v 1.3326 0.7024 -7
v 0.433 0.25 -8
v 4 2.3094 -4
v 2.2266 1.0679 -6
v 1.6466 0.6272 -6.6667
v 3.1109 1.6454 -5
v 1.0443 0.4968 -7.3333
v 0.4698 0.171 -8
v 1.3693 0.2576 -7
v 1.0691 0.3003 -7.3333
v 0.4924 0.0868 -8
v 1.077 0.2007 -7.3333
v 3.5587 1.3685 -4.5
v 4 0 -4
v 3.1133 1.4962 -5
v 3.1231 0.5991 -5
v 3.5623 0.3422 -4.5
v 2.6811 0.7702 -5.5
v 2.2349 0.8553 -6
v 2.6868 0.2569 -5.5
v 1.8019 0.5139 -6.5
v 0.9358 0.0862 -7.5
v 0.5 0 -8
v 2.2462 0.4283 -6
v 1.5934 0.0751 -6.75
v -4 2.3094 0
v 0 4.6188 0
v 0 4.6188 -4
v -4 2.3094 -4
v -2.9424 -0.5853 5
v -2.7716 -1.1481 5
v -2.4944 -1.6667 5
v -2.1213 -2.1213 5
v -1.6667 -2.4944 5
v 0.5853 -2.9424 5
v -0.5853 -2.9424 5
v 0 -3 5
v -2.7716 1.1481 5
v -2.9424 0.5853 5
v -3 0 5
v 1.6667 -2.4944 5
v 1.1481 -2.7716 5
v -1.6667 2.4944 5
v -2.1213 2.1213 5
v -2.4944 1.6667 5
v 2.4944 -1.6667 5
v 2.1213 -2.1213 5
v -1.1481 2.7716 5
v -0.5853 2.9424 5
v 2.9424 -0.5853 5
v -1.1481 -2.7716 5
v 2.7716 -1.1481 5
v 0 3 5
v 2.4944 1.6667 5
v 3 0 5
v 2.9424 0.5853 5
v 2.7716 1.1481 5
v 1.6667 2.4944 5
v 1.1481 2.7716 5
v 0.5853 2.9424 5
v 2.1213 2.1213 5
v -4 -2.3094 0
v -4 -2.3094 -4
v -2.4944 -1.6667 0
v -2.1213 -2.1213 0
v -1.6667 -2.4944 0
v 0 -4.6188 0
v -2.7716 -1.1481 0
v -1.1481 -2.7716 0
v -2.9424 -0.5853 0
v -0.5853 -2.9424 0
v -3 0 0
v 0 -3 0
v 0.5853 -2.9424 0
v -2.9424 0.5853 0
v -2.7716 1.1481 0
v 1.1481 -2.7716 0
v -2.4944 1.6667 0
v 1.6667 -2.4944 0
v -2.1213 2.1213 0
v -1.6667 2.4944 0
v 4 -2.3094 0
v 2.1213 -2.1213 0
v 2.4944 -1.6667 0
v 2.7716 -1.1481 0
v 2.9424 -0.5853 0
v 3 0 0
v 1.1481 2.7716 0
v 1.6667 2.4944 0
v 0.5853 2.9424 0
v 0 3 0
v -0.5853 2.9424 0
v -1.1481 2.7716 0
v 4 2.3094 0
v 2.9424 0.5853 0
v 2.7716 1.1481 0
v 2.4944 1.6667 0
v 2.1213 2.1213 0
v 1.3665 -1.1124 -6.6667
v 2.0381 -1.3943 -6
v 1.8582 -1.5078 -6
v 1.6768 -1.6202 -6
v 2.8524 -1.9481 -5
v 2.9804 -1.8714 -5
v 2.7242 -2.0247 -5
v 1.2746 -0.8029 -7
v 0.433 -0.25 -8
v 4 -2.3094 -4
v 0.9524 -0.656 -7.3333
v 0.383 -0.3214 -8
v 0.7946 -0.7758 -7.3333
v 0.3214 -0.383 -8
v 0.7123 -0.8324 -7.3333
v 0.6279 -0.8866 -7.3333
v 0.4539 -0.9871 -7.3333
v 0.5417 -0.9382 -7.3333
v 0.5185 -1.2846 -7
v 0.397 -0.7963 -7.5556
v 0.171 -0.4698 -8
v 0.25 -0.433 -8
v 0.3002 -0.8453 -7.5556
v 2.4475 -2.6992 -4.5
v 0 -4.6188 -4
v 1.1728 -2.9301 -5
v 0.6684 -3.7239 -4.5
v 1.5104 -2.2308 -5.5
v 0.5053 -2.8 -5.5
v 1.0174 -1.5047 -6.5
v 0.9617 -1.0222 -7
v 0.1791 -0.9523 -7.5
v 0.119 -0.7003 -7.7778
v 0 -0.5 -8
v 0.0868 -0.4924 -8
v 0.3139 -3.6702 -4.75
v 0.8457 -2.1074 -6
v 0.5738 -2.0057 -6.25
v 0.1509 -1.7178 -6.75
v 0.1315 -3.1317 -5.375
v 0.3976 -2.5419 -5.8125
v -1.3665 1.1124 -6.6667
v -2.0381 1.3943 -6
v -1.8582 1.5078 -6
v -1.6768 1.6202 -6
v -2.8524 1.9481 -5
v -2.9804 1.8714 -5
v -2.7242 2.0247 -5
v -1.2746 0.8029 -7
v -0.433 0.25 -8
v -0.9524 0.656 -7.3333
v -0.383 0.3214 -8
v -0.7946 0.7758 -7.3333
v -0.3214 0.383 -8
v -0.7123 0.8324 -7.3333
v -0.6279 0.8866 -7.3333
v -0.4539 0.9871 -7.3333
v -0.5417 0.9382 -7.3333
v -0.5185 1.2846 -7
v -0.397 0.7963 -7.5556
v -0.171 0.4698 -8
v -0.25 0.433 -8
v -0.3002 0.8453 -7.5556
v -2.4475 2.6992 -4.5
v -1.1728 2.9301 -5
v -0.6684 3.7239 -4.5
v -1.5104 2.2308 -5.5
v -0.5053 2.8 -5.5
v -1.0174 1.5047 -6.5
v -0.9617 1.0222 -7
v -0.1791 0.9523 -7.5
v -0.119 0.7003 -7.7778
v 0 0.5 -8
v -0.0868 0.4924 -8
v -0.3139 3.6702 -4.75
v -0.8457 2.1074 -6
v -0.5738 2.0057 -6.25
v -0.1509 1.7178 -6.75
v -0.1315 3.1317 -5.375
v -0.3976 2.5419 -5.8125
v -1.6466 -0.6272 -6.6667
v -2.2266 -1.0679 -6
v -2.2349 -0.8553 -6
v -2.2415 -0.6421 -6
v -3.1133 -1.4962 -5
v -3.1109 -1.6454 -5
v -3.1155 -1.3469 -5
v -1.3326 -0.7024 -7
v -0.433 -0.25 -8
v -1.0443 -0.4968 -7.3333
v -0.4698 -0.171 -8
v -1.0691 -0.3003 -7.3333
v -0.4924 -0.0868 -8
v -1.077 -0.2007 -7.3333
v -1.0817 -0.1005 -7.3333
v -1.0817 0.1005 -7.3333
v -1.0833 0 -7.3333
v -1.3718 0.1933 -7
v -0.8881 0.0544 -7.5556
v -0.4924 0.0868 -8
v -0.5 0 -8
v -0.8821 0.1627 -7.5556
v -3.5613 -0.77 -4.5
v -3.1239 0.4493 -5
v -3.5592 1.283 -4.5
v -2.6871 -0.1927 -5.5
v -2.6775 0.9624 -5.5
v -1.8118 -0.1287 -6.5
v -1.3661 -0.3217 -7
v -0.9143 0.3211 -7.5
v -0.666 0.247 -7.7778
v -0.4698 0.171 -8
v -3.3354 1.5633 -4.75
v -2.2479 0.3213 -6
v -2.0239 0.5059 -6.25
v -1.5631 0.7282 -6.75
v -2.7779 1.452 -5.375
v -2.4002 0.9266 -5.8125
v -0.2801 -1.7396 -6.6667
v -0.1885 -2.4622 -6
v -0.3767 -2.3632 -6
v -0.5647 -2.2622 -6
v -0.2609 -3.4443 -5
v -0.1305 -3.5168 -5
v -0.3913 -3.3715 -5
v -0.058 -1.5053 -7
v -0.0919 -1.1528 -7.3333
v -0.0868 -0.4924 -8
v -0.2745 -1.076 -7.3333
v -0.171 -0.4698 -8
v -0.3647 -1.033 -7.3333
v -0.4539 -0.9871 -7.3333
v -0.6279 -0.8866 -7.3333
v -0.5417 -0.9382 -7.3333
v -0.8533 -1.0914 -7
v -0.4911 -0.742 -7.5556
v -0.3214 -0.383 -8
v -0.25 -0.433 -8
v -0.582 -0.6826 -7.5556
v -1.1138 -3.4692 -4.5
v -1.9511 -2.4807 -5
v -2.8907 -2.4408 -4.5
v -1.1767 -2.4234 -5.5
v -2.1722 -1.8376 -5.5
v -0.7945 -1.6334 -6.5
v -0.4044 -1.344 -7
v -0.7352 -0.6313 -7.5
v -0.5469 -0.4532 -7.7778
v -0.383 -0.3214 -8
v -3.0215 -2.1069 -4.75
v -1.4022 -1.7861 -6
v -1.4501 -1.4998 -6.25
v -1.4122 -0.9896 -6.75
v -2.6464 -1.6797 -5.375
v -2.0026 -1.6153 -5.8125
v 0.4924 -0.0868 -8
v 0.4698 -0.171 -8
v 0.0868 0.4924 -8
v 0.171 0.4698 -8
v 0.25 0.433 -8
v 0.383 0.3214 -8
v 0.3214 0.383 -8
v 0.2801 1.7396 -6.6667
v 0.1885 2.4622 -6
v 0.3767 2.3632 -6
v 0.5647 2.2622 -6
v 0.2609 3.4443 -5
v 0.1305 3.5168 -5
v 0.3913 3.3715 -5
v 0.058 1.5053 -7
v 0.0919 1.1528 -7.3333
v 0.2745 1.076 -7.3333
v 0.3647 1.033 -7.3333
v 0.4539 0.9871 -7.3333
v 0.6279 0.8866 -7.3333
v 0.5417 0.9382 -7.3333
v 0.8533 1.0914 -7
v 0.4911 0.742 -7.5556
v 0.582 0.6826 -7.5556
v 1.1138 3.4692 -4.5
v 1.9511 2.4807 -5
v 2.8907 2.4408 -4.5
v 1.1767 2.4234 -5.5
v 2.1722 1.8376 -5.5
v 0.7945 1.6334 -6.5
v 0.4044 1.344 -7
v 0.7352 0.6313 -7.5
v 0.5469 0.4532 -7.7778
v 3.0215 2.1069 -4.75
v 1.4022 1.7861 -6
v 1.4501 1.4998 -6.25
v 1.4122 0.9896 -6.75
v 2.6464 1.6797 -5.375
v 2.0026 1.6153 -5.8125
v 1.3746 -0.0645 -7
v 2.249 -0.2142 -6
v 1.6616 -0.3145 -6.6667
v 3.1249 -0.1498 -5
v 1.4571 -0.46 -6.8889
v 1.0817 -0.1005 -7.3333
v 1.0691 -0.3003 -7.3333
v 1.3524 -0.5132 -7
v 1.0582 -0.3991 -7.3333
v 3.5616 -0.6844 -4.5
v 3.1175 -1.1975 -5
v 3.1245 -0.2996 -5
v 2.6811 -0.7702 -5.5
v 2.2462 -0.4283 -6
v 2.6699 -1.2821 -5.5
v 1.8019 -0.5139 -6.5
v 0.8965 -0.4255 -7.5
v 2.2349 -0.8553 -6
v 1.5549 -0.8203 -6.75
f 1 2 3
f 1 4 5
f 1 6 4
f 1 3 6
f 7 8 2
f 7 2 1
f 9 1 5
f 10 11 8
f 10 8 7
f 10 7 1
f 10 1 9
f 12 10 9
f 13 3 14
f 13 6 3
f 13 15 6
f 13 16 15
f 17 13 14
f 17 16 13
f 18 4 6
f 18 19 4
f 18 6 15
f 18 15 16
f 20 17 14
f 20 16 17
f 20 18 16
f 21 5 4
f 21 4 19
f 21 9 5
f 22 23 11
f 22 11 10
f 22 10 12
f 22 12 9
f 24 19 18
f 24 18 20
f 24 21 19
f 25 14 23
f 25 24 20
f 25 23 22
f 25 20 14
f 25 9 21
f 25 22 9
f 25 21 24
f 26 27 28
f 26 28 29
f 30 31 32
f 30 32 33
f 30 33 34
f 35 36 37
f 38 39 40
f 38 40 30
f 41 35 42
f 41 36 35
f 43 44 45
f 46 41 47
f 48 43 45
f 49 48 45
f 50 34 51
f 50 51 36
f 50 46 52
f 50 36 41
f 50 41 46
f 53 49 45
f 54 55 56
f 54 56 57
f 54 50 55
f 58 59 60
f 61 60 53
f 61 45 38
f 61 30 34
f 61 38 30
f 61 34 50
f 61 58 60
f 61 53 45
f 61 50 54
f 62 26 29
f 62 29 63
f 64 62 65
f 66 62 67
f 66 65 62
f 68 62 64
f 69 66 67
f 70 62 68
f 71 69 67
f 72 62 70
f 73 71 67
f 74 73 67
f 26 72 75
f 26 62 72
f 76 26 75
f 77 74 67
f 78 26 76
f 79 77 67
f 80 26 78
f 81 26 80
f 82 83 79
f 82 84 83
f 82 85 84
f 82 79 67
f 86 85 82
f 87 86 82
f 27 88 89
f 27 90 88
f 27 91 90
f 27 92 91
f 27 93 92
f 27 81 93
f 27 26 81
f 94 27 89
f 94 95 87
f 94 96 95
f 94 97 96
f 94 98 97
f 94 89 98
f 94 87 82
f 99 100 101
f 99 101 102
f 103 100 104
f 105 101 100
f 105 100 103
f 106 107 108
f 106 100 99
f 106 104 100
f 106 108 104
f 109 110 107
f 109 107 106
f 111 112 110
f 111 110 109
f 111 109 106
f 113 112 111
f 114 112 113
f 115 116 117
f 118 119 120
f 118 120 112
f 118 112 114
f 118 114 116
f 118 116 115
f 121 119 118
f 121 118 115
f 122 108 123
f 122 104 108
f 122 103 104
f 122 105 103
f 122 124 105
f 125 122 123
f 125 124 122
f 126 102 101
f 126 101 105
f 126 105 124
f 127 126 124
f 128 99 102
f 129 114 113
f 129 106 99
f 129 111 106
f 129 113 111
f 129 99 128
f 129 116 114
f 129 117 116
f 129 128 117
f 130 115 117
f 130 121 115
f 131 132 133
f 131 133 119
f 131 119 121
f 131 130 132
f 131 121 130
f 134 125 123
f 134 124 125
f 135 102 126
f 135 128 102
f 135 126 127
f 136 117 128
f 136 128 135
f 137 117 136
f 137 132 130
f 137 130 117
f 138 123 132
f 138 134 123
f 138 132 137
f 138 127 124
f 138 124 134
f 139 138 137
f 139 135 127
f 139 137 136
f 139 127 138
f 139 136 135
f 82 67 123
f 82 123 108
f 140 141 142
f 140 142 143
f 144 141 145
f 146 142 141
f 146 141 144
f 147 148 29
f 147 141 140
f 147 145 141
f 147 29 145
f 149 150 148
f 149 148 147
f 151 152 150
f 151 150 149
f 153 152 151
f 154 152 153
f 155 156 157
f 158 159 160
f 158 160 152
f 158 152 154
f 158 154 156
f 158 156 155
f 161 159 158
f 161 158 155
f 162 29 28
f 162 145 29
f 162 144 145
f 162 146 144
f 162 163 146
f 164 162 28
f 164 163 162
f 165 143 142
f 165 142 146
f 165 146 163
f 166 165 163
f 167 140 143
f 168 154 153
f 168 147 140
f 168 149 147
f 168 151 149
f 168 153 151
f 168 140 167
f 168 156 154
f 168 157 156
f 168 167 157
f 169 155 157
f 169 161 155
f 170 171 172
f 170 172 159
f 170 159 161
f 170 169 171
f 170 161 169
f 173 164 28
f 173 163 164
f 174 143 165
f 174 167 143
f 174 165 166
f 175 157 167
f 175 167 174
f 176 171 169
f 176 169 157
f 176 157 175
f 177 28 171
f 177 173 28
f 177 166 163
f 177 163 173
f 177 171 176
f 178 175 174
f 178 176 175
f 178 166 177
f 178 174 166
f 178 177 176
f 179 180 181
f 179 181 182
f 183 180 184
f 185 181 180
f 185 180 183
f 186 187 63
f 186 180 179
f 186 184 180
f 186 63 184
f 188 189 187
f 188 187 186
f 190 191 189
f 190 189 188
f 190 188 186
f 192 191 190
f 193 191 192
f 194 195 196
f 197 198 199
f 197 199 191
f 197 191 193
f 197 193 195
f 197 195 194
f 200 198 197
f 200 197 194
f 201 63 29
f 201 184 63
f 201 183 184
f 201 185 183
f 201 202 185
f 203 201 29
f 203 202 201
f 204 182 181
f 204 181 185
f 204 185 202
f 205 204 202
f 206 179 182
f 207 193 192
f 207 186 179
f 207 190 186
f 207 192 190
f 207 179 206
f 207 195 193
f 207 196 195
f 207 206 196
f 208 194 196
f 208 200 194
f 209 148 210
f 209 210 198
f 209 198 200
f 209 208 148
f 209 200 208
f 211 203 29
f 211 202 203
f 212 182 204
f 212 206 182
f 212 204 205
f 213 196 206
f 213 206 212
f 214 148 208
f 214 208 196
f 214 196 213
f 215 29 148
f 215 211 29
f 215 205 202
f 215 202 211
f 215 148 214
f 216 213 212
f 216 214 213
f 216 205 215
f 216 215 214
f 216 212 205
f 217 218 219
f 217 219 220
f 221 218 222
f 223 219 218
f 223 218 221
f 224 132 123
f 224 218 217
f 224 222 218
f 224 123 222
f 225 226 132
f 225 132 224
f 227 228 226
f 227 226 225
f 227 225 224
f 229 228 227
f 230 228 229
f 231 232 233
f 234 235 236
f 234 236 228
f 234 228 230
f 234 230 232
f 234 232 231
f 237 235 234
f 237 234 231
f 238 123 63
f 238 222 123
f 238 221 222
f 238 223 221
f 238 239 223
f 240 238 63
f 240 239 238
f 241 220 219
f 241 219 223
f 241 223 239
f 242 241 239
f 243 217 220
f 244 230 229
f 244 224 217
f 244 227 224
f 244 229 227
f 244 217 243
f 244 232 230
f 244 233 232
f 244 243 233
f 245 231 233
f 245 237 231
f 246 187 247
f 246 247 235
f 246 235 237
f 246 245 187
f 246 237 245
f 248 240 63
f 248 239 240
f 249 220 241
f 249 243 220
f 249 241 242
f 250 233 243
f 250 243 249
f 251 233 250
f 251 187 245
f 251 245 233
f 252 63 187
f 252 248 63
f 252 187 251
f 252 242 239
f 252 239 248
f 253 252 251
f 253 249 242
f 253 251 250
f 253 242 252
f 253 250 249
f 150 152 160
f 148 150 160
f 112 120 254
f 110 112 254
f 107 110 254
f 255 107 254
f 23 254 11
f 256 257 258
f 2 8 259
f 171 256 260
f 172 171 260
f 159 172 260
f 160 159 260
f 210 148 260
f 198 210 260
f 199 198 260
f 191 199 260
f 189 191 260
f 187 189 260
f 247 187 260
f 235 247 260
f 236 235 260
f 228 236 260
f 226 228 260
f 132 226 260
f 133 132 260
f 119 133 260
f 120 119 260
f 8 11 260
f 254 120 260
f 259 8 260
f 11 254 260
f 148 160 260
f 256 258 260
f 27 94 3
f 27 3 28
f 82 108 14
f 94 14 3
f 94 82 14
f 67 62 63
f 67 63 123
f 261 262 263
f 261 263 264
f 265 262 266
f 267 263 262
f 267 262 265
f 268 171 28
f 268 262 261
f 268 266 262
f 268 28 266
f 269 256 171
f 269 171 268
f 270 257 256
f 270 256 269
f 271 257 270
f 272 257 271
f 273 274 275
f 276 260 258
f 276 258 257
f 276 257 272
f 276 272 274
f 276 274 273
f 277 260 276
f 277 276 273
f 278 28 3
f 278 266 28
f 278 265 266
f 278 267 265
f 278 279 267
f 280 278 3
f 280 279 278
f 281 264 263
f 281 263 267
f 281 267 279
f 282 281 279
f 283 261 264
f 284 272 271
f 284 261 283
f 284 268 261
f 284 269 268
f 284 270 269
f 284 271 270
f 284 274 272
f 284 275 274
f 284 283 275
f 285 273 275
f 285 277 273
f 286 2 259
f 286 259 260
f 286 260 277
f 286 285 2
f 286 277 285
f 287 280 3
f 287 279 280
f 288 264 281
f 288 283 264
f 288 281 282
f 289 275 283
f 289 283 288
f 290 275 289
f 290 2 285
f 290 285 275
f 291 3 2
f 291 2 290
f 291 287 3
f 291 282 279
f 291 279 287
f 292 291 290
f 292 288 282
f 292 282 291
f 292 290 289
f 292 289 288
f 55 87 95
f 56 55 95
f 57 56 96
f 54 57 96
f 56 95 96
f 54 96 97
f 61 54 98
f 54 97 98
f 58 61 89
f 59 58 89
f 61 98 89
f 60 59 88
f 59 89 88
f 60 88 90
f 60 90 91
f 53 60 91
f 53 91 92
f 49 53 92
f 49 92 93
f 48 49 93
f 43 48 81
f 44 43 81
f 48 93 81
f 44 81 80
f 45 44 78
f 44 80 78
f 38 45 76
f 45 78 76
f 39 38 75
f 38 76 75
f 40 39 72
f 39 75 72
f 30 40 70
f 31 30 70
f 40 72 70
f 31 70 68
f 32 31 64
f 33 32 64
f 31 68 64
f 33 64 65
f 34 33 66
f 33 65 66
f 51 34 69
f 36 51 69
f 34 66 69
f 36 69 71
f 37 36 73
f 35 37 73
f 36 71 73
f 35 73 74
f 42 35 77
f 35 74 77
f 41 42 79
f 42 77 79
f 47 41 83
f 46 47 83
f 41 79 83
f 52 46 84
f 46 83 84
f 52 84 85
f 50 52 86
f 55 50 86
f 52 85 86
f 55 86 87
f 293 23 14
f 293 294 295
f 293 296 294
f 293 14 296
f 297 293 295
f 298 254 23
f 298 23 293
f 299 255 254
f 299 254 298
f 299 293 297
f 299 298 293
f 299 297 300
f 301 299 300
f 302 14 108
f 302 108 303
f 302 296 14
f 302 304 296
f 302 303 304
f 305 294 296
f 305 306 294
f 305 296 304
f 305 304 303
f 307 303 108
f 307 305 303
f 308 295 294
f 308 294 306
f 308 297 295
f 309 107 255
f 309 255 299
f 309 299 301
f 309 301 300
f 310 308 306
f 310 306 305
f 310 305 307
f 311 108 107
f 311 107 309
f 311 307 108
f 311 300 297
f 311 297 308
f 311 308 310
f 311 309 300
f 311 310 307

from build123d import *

# Parameters (mm, degrees)
F0_R     = 3
F1_DEPTH = 5
F2_DEPTH = 4
F4_R     = 0.5


with BuildPart() as f1:
    # F0 (on Top) → F1 (new body)
    with BuildSketch(Plane.XY):
        Circle(F0_R)
    extrude(amount=F1_DEPTH)

    # F0 (on Top) → F2 (join)
    with BuildSketch(Plane.XY):
        Polygon((4, -2.309401), (4, 2.309401), (0, 4.618802), (-4, 2.309401), (-4, -2.309401), (0, -4.618802), align=None)
        Circle(F0_R, mode=Mode.SUBTRACT)
        Circle(F0_R)
    extrude(amount=-F2_DEPTH)

    # F2_face (on face) → F5 section 0
    with BuildSketch(Plane(origin=(0, 0, -4), x_dir=(1, 0, 0), z_dir=(0, 0, -1))):
        Polygon((4, -2.309401), (4, 2.309401), (0, 4.618802), (-4, 2.309401), (-4, -2.309401), (0, -4.618802), align=None)
    # F4 (on offset) → F5 section 1
    with BuildSketch(Plane.XY.offset(-8)):
        Circle(F4_R)
    loft()


solid = f1.part
